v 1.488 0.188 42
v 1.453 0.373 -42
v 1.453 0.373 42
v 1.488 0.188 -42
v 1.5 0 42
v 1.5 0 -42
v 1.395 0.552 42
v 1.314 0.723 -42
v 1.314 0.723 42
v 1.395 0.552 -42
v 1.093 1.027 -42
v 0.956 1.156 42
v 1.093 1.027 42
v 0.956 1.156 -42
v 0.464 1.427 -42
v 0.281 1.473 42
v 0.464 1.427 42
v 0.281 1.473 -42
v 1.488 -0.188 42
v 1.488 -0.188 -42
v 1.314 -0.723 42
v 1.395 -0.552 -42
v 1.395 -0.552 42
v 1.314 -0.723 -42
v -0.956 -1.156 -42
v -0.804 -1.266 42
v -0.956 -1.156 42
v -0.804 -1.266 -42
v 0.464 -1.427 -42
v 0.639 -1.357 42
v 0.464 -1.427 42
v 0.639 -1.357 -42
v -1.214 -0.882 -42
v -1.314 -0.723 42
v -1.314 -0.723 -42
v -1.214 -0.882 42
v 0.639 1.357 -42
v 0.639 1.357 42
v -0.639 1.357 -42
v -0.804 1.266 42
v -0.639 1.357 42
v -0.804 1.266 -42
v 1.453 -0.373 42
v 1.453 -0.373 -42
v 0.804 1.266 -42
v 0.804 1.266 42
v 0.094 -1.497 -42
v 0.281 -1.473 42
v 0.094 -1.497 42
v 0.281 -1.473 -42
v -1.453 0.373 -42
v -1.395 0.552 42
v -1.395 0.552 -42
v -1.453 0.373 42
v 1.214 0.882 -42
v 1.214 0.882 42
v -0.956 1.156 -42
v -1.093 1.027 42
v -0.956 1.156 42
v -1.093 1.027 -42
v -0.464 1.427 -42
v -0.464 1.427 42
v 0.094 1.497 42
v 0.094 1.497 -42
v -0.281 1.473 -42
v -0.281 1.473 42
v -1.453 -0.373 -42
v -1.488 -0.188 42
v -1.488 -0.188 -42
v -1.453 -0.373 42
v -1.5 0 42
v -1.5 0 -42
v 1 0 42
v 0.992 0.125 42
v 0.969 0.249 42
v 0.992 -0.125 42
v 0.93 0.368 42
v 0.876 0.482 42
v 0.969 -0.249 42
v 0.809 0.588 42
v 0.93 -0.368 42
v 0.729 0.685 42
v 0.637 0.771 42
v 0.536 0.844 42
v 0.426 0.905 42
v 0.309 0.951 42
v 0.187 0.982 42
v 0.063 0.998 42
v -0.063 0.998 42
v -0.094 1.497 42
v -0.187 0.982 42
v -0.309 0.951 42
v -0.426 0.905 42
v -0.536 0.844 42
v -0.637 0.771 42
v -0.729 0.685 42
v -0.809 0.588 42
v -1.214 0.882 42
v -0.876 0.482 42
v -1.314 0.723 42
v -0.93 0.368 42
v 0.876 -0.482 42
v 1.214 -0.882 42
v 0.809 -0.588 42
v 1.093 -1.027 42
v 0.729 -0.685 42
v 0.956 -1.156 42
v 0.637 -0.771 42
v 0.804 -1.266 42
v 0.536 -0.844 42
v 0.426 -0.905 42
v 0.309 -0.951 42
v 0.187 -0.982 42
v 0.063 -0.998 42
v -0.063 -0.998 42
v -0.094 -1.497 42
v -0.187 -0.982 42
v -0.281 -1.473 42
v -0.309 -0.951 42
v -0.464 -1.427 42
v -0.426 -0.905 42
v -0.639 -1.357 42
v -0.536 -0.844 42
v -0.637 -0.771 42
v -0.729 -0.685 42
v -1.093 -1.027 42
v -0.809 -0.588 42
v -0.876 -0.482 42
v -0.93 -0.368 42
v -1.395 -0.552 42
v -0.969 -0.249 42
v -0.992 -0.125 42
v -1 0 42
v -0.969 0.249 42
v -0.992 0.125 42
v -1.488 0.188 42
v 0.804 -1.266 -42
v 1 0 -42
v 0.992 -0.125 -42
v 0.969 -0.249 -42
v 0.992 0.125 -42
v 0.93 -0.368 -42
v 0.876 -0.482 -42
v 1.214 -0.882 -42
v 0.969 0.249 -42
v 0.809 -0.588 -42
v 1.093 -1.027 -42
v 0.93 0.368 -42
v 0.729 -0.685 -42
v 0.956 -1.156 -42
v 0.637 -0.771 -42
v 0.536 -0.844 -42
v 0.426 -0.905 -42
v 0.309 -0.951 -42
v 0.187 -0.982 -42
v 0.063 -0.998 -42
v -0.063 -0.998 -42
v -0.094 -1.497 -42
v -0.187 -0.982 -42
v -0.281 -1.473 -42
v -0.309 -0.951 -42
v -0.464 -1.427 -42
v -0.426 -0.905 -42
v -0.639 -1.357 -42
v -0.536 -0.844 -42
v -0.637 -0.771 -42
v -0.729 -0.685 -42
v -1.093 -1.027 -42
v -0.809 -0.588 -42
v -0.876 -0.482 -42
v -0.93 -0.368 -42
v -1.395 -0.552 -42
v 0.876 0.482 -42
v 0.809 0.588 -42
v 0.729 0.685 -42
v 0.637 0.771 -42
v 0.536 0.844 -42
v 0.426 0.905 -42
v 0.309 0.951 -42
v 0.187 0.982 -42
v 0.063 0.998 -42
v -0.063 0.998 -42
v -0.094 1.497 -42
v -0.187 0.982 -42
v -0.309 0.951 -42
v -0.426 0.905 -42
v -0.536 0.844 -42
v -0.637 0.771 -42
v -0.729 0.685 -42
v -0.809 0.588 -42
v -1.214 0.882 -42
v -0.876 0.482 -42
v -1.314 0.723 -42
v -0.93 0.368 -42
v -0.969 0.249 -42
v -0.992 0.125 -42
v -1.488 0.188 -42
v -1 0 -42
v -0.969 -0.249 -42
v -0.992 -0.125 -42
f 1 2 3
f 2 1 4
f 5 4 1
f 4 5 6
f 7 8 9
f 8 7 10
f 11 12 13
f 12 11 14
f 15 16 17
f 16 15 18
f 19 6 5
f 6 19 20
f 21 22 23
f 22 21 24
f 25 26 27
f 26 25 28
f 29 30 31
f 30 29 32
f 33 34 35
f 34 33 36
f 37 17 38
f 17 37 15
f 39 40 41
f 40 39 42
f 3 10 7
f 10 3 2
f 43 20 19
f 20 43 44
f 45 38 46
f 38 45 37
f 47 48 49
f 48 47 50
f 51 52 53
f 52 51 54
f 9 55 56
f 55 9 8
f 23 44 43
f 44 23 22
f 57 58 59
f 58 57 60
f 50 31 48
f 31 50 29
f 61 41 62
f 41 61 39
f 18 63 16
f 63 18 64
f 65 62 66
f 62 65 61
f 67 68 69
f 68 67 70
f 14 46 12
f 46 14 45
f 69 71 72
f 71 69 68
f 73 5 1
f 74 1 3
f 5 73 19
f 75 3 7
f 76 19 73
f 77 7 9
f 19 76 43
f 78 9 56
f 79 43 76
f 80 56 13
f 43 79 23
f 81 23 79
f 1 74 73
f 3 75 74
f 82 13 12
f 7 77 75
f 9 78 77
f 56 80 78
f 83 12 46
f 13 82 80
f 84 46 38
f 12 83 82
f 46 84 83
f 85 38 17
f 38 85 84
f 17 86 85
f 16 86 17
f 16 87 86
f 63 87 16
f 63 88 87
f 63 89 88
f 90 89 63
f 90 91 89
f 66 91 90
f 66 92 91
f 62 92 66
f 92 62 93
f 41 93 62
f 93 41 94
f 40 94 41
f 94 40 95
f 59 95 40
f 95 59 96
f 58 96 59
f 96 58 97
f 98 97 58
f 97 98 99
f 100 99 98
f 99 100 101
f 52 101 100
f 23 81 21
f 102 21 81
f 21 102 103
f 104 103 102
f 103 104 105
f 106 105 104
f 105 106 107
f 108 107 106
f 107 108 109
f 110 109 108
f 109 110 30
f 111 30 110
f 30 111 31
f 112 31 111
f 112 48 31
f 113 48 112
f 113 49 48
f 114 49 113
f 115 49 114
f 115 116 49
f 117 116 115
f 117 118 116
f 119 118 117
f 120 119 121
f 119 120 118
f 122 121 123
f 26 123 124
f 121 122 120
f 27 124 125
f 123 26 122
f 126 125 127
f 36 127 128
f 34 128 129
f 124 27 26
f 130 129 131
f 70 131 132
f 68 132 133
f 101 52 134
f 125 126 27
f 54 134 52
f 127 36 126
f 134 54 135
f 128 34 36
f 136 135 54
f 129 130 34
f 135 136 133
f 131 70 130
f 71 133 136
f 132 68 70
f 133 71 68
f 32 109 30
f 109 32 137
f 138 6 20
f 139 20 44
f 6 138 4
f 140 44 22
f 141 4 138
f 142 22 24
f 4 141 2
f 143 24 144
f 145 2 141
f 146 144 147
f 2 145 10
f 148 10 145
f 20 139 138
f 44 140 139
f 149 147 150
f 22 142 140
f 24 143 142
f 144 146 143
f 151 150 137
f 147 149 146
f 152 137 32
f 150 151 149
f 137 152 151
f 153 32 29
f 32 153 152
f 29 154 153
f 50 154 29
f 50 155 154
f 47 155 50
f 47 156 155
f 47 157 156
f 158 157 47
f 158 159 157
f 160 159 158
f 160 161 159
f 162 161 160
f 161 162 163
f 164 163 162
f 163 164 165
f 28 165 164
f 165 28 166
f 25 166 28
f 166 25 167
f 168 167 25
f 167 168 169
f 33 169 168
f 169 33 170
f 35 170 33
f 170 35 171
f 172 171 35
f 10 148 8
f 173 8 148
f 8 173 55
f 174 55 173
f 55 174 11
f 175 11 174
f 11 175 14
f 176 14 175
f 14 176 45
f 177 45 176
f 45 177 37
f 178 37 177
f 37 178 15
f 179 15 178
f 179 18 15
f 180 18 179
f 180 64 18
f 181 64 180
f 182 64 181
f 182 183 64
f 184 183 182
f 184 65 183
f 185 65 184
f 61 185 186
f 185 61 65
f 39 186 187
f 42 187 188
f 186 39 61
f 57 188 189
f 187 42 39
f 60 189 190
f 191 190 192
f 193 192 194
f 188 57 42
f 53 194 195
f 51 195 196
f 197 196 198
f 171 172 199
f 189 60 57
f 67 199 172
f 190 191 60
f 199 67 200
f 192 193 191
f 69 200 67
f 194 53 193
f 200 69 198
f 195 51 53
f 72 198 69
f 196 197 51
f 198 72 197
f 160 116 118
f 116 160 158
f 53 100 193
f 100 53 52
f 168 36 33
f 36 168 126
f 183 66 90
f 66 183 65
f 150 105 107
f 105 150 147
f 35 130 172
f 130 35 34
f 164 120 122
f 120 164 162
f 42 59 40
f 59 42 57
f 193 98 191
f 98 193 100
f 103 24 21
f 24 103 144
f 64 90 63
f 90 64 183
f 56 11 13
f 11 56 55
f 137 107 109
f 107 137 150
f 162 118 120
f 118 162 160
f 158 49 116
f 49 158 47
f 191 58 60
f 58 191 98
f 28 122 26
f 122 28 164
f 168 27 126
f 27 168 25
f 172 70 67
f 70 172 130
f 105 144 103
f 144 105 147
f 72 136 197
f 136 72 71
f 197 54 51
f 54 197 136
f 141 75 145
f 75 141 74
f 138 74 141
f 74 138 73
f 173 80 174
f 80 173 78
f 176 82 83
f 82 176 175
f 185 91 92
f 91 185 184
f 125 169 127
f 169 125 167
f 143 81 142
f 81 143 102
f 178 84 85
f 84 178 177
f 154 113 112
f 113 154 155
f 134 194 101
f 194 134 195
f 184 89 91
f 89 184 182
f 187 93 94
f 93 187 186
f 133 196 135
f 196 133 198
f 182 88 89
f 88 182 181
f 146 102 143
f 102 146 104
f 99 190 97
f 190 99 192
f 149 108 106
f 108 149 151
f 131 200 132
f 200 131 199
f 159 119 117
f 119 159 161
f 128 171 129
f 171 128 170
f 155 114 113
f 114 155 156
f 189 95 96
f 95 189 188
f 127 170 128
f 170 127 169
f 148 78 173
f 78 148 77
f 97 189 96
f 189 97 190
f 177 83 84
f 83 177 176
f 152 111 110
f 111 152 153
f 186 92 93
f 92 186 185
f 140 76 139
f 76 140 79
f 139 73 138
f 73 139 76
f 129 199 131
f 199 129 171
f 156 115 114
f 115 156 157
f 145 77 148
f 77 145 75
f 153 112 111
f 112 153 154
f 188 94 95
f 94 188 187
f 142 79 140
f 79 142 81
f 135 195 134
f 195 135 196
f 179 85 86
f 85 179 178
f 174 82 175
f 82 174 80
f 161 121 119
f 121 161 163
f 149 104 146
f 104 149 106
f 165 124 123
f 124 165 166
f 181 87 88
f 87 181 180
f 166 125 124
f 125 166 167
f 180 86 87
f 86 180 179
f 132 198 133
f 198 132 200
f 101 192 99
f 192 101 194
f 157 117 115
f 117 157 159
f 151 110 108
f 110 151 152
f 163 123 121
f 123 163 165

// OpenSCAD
$fn = 50;


difference() {
	union() {
		translate(v = [0, 0, -42.0000000000]) {
			cylinder(h = 84, r = 1.5000000000);
		}
	}
	union() {
		translate(v = [0, 0, -100.0000000000]) {
			cylinder(h = 200, r = 1.0000000000);
		}
	}
}
